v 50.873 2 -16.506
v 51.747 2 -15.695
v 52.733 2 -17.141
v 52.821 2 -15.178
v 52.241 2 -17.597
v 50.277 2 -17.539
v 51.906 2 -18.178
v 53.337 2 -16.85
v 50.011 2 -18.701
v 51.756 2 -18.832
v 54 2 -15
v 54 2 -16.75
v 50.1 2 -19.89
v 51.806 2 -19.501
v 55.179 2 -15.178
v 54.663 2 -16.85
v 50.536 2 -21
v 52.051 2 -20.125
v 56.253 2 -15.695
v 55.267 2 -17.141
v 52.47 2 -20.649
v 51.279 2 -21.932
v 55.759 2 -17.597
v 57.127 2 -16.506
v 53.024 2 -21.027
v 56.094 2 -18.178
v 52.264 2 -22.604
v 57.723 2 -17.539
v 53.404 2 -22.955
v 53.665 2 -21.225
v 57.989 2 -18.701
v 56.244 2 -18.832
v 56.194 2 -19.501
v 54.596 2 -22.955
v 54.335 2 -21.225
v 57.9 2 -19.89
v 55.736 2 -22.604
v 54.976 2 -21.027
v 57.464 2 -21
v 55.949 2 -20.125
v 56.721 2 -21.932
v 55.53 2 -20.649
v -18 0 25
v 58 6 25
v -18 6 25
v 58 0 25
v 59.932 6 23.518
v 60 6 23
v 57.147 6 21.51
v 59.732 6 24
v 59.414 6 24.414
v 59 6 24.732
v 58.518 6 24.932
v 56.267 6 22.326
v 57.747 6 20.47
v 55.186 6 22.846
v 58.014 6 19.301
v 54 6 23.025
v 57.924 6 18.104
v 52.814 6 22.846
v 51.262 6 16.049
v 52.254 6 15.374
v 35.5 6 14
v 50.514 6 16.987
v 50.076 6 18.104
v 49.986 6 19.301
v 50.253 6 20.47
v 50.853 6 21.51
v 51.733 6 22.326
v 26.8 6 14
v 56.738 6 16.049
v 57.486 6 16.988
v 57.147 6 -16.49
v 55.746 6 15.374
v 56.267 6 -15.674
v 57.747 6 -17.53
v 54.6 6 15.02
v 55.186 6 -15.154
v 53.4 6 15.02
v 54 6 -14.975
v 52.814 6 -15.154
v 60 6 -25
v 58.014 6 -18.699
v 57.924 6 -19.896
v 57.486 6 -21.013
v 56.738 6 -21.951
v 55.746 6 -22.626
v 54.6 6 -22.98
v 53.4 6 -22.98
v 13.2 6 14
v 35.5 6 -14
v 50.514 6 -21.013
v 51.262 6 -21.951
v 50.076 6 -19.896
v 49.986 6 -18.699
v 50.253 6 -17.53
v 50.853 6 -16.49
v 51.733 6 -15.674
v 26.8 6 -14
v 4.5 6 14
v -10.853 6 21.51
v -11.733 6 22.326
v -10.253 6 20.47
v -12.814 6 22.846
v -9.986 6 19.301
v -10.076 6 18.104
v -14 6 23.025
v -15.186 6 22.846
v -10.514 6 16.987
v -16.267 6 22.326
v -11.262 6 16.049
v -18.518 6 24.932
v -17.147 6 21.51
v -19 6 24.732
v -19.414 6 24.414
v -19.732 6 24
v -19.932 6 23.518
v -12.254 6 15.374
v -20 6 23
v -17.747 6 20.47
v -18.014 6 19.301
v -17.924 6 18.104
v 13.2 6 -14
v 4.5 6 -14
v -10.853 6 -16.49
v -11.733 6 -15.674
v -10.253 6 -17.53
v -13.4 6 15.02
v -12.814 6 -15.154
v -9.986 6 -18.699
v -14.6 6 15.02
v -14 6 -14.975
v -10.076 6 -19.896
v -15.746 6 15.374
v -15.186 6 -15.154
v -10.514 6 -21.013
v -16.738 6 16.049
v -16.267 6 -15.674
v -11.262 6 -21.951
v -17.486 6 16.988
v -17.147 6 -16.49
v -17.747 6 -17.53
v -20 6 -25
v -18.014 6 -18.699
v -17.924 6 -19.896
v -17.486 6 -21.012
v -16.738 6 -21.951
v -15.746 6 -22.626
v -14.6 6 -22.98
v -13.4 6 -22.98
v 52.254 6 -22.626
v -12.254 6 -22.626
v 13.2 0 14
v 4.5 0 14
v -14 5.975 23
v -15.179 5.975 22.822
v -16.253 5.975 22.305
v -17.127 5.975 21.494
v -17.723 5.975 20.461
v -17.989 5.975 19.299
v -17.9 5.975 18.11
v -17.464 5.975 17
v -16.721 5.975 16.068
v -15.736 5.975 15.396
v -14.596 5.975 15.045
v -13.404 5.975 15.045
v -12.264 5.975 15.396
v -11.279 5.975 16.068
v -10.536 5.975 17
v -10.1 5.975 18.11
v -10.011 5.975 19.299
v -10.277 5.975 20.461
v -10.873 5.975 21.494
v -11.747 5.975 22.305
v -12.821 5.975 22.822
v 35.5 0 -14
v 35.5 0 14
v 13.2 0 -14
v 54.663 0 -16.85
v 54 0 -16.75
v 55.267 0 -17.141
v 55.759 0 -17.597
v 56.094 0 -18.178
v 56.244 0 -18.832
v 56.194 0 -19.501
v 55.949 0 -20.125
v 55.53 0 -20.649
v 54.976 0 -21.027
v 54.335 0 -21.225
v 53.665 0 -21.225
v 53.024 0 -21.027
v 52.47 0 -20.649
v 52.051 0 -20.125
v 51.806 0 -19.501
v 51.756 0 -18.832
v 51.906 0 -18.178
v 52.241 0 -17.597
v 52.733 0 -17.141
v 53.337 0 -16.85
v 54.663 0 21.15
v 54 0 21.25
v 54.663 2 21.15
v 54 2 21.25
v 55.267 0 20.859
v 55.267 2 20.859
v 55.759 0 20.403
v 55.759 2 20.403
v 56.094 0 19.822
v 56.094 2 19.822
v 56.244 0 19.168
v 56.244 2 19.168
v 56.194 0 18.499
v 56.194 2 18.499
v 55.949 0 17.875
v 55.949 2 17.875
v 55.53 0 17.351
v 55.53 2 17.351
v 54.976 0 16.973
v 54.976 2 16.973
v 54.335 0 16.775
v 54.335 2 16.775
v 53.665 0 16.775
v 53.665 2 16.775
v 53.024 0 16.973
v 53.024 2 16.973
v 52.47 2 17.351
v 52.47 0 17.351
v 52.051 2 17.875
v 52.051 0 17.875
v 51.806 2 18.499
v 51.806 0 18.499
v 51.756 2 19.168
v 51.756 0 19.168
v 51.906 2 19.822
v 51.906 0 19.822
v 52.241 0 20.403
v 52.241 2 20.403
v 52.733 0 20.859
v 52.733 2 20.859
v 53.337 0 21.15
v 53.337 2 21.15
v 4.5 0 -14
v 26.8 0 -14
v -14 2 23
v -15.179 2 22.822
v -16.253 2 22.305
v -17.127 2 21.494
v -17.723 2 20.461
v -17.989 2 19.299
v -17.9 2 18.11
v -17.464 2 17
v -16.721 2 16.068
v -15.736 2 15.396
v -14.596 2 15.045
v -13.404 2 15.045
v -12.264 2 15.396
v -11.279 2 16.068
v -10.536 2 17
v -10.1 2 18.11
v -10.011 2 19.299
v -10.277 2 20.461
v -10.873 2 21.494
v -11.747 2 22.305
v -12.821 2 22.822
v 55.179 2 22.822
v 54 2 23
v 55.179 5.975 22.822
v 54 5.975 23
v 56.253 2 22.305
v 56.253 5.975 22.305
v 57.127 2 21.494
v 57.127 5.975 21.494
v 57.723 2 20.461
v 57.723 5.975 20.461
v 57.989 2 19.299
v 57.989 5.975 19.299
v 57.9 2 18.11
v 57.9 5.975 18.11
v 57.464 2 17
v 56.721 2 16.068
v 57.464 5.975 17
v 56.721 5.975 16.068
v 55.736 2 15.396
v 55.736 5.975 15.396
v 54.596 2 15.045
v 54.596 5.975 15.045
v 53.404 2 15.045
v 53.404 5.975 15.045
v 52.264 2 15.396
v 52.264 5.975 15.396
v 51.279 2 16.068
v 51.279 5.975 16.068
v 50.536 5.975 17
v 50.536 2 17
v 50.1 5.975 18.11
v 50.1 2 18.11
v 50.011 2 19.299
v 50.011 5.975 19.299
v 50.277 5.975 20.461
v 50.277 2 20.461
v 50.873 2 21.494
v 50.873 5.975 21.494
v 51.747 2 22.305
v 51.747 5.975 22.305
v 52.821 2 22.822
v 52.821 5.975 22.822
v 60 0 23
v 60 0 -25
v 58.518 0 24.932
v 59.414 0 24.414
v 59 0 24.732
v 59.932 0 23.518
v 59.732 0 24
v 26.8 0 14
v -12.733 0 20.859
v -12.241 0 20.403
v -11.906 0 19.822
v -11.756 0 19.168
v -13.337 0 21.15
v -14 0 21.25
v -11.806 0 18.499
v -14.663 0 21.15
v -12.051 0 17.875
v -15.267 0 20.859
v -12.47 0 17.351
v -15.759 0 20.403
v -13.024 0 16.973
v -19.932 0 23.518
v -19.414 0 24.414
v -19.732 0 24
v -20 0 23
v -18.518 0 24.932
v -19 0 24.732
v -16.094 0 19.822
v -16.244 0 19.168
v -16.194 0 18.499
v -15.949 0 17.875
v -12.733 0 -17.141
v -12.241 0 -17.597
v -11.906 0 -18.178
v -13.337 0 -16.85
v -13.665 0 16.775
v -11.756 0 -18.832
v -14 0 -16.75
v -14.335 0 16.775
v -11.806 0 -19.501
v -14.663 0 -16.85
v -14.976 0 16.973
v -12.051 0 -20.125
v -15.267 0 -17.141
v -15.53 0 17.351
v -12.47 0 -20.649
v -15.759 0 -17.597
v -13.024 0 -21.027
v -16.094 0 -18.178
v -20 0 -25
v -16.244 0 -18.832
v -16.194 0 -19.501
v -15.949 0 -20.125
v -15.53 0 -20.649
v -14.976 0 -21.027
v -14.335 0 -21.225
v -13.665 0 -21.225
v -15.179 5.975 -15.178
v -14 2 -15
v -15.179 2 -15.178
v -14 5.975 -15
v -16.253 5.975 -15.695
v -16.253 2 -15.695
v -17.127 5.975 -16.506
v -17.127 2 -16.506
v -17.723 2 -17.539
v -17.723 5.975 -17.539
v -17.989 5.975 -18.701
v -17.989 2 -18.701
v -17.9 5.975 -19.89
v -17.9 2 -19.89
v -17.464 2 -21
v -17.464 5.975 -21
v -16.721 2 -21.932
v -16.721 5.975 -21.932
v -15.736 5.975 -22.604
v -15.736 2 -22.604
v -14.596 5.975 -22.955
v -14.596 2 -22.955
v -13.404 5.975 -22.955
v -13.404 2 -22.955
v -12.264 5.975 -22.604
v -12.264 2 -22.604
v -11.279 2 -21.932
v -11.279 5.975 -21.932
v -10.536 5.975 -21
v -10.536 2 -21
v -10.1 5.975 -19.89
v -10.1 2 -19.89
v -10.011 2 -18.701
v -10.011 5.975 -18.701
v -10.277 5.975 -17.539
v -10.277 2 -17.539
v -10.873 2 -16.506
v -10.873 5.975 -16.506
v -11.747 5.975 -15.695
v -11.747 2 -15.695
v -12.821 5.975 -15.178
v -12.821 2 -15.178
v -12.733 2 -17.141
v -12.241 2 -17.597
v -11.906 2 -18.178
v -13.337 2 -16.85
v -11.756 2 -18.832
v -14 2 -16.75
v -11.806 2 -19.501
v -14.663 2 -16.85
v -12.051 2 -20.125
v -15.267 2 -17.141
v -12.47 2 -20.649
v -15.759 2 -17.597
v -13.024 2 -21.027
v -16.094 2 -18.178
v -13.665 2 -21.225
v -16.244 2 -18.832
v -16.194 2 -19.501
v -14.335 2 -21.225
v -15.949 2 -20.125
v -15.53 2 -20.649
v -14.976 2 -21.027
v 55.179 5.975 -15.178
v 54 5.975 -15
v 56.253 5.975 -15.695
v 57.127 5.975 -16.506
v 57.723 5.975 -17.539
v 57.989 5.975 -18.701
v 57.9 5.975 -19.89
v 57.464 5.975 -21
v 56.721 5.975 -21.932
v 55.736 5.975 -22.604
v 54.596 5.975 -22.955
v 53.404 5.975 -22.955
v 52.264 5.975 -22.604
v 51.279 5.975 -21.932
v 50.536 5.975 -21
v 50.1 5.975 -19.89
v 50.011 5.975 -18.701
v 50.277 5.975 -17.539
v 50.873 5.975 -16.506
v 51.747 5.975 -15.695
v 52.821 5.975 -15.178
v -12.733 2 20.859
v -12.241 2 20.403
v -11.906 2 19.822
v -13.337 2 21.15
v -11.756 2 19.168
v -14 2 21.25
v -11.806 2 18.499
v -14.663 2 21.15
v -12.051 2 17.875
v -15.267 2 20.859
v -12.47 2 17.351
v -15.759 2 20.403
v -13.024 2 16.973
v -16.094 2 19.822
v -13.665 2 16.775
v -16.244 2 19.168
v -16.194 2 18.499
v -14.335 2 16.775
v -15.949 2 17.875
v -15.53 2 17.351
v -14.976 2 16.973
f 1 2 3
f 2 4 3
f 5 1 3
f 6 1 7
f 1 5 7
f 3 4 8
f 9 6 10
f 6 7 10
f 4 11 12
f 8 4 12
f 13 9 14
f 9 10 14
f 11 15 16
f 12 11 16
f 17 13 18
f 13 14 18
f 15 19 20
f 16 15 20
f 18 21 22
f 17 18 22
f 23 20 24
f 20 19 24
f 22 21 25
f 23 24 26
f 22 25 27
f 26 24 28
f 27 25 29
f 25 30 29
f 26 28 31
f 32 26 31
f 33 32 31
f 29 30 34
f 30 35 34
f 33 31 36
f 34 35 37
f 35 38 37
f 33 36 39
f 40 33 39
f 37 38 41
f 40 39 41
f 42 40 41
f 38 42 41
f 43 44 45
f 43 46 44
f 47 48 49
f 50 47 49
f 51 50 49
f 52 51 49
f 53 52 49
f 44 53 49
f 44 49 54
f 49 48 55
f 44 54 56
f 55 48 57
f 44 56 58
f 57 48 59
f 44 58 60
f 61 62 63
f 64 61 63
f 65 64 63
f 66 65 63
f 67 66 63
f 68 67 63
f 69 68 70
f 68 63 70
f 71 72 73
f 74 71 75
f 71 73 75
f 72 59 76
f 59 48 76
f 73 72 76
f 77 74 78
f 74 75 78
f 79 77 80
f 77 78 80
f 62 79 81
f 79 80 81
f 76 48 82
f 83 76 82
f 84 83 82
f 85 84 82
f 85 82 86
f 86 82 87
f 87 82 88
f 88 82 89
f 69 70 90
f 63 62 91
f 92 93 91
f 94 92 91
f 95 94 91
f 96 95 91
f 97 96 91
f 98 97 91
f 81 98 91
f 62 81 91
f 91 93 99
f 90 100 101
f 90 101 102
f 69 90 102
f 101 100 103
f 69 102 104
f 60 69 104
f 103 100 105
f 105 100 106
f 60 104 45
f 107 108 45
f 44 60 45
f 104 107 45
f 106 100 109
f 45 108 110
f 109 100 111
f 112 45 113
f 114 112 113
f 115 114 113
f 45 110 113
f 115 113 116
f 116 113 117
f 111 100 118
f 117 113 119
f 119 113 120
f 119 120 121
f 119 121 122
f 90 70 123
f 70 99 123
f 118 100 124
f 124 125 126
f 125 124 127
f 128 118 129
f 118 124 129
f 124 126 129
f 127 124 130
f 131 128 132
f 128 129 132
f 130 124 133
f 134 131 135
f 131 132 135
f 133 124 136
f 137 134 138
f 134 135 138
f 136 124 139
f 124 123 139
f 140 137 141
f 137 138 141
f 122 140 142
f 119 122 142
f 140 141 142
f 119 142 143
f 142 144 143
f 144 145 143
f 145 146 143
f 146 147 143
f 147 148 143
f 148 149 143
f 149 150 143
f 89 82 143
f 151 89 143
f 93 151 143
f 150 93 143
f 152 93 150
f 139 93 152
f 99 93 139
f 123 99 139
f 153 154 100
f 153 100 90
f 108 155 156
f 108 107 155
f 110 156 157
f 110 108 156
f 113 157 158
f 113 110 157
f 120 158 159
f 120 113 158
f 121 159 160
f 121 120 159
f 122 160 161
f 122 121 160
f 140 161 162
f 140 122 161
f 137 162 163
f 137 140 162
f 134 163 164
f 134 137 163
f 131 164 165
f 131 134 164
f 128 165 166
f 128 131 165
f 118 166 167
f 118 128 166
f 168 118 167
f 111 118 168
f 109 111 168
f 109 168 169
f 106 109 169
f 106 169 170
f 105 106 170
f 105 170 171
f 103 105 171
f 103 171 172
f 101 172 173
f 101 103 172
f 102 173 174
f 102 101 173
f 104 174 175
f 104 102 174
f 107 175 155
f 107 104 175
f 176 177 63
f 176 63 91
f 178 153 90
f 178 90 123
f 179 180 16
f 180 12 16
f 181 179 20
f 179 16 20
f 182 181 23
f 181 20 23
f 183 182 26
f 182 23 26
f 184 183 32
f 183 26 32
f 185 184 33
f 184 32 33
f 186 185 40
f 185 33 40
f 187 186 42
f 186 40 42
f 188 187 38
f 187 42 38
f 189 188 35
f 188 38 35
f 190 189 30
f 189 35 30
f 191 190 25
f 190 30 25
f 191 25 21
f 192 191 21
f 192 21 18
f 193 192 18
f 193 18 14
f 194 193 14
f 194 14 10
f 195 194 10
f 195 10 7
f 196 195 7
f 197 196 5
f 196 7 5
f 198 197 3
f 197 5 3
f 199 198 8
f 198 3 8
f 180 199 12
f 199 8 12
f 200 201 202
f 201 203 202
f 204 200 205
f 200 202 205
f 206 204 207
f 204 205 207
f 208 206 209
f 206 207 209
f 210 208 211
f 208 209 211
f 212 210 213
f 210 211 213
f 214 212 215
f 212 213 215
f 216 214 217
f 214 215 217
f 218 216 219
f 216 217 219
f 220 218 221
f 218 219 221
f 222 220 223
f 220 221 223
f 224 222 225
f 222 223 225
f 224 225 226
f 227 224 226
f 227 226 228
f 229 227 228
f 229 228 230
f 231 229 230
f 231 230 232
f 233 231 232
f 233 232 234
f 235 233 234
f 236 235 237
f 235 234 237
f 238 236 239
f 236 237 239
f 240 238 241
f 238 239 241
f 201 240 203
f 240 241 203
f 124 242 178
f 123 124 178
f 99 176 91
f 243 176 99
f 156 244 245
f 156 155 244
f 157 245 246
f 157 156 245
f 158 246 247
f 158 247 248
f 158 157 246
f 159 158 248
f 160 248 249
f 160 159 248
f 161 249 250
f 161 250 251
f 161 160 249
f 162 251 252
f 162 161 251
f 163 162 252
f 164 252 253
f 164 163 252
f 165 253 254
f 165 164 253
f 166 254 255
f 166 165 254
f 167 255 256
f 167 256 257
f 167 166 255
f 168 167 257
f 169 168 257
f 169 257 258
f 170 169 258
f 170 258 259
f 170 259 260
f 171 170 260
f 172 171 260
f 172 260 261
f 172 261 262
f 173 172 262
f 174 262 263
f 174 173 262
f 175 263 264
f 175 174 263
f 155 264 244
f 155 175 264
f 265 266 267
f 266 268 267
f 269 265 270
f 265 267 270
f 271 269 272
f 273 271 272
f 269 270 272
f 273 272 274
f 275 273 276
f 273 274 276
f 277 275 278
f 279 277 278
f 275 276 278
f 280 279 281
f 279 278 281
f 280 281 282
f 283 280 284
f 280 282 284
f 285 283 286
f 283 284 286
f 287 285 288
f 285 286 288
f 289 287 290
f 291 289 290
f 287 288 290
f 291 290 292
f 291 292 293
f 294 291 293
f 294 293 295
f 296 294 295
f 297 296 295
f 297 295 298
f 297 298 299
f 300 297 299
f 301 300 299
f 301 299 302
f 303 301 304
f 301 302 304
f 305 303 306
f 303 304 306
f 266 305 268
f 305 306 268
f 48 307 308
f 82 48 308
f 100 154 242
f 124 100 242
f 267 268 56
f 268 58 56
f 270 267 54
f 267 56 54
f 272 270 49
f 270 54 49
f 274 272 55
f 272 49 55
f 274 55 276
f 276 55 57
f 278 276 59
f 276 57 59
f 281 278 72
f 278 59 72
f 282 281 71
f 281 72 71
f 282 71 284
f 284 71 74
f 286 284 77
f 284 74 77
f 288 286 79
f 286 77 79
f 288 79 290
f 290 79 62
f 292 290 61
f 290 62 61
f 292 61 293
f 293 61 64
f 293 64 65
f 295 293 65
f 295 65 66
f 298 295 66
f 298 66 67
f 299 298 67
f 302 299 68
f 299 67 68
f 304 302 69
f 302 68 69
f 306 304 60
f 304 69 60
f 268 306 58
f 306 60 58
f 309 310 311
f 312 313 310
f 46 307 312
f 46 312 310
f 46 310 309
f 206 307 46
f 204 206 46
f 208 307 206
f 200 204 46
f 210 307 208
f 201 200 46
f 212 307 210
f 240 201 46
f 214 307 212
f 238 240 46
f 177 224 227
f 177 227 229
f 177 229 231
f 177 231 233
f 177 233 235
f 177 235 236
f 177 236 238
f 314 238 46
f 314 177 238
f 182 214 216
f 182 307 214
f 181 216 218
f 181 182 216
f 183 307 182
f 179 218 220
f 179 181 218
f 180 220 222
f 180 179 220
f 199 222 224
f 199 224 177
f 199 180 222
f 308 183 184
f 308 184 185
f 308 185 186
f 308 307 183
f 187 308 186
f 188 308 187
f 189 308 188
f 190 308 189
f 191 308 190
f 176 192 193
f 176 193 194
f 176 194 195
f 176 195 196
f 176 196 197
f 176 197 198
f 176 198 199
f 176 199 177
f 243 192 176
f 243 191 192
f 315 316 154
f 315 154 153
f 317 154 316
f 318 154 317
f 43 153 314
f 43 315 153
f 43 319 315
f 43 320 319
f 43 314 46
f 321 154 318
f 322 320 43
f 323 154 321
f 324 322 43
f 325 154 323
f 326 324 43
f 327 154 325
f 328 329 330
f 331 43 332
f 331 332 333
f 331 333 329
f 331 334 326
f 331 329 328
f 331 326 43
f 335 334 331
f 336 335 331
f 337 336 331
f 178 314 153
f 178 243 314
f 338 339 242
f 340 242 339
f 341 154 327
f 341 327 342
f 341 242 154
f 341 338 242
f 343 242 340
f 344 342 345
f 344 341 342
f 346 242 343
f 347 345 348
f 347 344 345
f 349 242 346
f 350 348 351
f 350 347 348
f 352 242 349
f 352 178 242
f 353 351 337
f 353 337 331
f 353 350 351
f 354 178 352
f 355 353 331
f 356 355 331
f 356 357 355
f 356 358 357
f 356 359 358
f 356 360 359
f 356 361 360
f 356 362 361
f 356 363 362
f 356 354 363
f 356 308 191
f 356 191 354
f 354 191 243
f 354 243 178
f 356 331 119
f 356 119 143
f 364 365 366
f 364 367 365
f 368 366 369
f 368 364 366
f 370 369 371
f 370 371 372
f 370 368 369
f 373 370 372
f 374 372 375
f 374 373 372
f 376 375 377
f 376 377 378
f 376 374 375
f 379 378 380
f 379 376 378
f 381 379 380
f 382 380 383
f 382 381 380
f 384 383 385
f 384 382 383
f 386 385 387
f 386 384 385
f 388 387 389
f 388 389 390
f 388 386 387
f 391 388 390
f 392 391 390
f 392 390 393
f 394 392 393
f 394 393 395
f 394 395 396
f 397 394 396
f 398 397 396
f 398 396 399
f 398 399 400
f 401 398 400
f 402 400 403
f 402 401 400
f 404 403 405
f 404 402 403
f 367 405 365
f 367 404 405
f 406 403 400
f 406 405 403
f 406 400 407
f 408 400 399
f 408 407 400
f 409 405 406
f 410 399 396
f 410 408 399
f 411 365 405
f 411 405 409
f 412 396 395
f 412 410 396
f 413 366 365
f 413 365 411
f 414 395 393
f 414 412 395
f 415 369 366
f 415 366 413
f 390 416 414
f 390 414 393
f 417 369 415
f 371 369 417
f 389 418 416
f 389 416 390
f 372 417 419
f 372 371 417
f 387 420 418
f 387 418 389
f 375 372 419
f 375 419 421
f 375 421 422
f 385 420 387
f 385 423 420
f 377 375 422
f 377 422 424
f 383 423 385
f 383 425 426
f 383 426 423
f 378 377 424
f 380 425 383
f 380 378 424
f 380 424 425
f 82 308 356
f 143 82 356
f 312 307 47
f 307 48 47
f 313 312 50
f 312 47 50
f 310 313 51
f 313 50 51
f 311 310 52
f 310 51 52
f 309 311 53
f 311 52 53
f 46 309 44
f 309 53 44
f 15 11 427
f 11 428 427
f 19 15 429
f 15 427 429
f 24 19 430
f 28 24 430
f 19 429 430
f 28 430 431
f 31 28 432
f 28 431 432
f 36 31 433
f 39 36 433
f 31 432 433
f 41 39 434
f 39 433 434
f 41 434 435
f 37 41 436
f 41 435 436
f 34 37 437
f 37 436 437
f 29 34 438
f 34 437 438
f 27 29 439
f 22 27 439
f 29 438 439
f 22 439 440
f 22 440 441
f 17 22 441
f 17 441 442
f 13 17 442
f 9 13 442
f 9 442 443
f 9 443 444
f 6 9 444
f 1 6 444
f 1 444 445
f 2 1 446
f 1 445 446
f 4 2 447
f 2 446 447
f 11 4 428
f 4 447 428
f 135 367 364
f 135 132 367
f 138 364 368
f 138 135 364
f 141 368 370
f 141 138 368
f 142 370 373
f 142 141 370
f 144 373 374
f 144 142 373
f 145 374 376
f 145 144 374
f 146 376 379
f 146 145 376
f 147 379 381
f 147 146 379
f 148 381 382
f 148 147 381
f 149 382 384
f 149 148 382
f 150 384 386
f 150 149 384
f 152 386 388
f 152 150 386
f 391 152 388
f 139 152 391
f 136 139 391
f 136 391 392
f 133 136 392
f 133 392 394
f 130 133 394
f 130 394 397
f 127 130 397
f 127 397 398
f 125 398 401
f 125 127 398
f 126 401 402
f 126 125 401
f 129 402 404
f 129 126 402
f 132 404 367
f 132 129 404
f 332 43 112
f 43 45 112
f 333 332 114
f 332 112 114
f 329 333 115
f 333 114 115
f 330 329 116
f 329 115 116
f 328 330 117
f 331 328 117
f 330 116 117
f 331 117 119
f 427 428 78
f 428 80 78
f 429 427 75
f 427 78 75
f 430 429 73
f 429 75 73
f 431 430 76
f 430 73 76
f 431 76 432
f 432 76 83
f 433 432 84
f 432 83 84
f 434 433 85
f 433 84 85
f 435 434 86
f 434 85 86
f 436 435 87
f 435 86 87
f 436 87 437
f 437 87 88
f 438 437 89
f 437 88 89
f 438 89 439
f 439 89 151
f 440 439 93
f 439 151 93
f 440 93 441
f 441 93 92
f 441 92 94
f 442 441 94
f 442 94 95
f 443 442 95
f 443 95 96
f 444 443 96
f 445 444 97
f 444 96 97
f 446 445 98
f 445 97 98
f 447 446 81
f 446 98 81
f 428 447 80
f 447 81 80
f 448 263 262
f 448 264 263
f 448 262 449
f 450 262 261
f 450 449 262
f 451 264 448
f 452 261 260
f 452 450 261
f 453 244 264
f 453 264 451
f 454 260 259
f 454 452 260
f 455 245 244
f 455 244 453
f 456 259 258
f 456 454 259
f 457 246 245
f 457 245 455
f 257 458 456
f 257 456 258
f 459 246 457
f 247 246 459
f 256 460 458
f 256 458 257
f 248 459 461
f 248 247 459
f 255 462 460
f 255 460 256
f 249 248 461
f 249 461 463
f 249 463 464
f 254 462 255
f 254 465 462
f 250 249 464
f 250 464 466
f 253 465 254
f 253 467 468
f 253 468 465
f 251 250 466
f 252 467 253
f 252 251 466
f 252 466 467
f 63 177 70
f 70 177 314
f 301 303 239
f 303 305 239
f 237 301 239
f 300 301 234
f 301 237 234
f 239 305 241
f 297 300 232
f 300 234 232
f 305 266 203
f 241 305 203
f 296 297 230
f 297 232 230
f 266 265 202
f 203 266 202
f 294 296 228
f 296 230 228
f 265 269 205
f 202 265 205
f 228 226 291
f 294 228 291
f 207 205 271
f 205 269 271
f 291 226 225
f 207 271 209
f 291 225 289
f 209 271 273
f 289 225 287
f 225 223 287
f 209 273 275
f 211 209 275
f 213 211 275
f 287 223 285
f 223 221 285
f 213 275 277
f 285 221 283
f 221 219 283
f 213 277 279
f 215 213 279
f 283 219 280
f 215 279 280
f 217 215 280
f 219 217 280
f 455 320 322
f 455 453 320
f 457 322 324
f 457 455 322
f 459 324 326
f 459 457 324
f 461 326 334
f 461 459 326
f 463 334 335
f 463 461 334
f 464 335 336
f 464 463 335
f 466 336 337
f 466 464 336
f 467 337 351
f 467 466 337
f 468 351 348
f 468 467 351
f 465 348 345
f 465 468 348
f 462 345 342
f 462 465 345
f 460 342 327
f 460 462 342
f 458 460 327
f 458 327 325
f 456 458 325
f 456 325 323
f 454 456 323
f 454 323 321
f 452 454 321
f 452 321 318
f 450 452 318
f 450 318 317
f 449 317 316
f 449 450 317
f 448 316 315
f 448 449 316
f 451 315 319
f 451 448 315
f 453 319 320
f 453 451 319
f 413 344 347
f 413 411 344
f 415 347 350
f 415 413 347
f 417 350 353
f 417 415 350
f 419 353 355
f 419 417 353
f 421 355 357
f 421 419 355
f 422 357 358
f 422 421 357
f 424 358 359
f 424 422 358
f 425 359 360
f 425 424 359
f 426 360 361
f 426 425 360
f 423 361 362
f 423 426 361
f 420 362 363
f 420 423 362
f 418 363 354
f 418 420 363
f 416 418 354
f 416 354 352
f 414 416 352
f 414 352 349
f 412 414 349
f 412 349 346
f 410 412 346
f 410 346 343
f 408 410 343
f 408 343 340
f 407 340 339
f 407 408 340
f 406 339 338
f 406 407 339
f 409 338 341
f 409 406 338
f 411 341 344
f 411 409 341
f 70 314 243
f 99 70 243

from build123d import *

# Parameters (mm, degrees)
SKETCH2_W                     = 40
SKETCH2_H                     = 50
SKETCH2_W_2                   = 8.7
SKETCH2_H_2                   = 28
BOSS_EXTRUDE1_DEPTH           = 6
CBORE_FOR_M4_SHCS2_AT_2_COUNT = 2
CBORE_FOR_M4_SHCS2_AT_2_PITCH = 38
FILLET1_R                     = 2


with BuildPart() as part:
    # Sketch2 → Boss-Extrude1 (new body)
    with BuildSketch(Plane(origin=(0, 0, 0), x_dir=(1, 0, 0), z_dir=(0, 1, 0))):
        Rectangle(SKETCH2_W, SKETCH2_H)
        with Locations((8.85, 0)):
            Rectangle(SKETCH2_W_2, SKETCH2_H_2, mode=Mode.SUBTRACT)
    boss_extrude1 = extrude(amount=BOSS_EXTRUDE1_DEPTH)

    # Sketch4 → CBORE for M4 SHCS2 (revolve, cut)
    with BuildSketch(Plane(origin=(-14, 6, 19), x_dir=(0, 0, 1), z_dir=(1, 0, 0))):
        Polygon((0, 0), (0, 6), (2.25, 6), (2.25, 4), (4, 4), (4, 0.025), (4.025, 0), align=None)
    cbore_for_m4_shcs2 = revolve(axis=Axis((-14, 12.35, 19), (0, -1, 0)), mode=Mode.SUBTRACT)

    # CBORE for M4 SHCS2 at 2: CBORE for M4 SHCS2 ×2
    with Locations(*[(0, 0, -i * CBORE_FOR_M4_SHCS2_AT_2_PITCH) for i in range(1, CBORE_FOR_M4_SHCS2_AT_2_COUNT)]):
        add(cbore_for_m4_shcs2, mode=Mode.SUBTRACT)

    # Mirror1: Boss-Extrude1, CBORE for M4 SHCS2 across plane
    add(boss_extrude1.mirror(Plane(origin=(20, 0, 0), x_dir=(0, 0, 1), z_dir=(1, 0, 0))))
    add(cbore_for_m4_shcs2.mirror(Plane(origin=(20, 0, 0), x_dir=(0, 0, 1), z_dir=(1, 0, 0))), mode=Mode.SUBTRACT)

    # Mirror1 copy 1 sketch → Mirror1 copy 1 (revolve, cut)
    with BuildSketch(Plane(origin=(54, 6, -19), x_dir=(0, 0, 1), z_dir=(-1, 0, 0))):
        Polygon((0, 0), (0, -6), (2.25, -6), (2.25, -4), (4, -4), (4, -0.025), (4.025, 0), align=None)
    revolve(axis=Axis((54, 12.35, -19), (0, 1, 0)), mode=Mode.SUBTRACT)

    # Fillet1
    fillet1_edges = [part.edges().sort_by_distance(p)[0] for p in [
        (60, 3, 25),
        (-20, 3, 25),
    ]]
    fillet(fillet1_edges, radius=FILLET1_R)


solid = part.part
